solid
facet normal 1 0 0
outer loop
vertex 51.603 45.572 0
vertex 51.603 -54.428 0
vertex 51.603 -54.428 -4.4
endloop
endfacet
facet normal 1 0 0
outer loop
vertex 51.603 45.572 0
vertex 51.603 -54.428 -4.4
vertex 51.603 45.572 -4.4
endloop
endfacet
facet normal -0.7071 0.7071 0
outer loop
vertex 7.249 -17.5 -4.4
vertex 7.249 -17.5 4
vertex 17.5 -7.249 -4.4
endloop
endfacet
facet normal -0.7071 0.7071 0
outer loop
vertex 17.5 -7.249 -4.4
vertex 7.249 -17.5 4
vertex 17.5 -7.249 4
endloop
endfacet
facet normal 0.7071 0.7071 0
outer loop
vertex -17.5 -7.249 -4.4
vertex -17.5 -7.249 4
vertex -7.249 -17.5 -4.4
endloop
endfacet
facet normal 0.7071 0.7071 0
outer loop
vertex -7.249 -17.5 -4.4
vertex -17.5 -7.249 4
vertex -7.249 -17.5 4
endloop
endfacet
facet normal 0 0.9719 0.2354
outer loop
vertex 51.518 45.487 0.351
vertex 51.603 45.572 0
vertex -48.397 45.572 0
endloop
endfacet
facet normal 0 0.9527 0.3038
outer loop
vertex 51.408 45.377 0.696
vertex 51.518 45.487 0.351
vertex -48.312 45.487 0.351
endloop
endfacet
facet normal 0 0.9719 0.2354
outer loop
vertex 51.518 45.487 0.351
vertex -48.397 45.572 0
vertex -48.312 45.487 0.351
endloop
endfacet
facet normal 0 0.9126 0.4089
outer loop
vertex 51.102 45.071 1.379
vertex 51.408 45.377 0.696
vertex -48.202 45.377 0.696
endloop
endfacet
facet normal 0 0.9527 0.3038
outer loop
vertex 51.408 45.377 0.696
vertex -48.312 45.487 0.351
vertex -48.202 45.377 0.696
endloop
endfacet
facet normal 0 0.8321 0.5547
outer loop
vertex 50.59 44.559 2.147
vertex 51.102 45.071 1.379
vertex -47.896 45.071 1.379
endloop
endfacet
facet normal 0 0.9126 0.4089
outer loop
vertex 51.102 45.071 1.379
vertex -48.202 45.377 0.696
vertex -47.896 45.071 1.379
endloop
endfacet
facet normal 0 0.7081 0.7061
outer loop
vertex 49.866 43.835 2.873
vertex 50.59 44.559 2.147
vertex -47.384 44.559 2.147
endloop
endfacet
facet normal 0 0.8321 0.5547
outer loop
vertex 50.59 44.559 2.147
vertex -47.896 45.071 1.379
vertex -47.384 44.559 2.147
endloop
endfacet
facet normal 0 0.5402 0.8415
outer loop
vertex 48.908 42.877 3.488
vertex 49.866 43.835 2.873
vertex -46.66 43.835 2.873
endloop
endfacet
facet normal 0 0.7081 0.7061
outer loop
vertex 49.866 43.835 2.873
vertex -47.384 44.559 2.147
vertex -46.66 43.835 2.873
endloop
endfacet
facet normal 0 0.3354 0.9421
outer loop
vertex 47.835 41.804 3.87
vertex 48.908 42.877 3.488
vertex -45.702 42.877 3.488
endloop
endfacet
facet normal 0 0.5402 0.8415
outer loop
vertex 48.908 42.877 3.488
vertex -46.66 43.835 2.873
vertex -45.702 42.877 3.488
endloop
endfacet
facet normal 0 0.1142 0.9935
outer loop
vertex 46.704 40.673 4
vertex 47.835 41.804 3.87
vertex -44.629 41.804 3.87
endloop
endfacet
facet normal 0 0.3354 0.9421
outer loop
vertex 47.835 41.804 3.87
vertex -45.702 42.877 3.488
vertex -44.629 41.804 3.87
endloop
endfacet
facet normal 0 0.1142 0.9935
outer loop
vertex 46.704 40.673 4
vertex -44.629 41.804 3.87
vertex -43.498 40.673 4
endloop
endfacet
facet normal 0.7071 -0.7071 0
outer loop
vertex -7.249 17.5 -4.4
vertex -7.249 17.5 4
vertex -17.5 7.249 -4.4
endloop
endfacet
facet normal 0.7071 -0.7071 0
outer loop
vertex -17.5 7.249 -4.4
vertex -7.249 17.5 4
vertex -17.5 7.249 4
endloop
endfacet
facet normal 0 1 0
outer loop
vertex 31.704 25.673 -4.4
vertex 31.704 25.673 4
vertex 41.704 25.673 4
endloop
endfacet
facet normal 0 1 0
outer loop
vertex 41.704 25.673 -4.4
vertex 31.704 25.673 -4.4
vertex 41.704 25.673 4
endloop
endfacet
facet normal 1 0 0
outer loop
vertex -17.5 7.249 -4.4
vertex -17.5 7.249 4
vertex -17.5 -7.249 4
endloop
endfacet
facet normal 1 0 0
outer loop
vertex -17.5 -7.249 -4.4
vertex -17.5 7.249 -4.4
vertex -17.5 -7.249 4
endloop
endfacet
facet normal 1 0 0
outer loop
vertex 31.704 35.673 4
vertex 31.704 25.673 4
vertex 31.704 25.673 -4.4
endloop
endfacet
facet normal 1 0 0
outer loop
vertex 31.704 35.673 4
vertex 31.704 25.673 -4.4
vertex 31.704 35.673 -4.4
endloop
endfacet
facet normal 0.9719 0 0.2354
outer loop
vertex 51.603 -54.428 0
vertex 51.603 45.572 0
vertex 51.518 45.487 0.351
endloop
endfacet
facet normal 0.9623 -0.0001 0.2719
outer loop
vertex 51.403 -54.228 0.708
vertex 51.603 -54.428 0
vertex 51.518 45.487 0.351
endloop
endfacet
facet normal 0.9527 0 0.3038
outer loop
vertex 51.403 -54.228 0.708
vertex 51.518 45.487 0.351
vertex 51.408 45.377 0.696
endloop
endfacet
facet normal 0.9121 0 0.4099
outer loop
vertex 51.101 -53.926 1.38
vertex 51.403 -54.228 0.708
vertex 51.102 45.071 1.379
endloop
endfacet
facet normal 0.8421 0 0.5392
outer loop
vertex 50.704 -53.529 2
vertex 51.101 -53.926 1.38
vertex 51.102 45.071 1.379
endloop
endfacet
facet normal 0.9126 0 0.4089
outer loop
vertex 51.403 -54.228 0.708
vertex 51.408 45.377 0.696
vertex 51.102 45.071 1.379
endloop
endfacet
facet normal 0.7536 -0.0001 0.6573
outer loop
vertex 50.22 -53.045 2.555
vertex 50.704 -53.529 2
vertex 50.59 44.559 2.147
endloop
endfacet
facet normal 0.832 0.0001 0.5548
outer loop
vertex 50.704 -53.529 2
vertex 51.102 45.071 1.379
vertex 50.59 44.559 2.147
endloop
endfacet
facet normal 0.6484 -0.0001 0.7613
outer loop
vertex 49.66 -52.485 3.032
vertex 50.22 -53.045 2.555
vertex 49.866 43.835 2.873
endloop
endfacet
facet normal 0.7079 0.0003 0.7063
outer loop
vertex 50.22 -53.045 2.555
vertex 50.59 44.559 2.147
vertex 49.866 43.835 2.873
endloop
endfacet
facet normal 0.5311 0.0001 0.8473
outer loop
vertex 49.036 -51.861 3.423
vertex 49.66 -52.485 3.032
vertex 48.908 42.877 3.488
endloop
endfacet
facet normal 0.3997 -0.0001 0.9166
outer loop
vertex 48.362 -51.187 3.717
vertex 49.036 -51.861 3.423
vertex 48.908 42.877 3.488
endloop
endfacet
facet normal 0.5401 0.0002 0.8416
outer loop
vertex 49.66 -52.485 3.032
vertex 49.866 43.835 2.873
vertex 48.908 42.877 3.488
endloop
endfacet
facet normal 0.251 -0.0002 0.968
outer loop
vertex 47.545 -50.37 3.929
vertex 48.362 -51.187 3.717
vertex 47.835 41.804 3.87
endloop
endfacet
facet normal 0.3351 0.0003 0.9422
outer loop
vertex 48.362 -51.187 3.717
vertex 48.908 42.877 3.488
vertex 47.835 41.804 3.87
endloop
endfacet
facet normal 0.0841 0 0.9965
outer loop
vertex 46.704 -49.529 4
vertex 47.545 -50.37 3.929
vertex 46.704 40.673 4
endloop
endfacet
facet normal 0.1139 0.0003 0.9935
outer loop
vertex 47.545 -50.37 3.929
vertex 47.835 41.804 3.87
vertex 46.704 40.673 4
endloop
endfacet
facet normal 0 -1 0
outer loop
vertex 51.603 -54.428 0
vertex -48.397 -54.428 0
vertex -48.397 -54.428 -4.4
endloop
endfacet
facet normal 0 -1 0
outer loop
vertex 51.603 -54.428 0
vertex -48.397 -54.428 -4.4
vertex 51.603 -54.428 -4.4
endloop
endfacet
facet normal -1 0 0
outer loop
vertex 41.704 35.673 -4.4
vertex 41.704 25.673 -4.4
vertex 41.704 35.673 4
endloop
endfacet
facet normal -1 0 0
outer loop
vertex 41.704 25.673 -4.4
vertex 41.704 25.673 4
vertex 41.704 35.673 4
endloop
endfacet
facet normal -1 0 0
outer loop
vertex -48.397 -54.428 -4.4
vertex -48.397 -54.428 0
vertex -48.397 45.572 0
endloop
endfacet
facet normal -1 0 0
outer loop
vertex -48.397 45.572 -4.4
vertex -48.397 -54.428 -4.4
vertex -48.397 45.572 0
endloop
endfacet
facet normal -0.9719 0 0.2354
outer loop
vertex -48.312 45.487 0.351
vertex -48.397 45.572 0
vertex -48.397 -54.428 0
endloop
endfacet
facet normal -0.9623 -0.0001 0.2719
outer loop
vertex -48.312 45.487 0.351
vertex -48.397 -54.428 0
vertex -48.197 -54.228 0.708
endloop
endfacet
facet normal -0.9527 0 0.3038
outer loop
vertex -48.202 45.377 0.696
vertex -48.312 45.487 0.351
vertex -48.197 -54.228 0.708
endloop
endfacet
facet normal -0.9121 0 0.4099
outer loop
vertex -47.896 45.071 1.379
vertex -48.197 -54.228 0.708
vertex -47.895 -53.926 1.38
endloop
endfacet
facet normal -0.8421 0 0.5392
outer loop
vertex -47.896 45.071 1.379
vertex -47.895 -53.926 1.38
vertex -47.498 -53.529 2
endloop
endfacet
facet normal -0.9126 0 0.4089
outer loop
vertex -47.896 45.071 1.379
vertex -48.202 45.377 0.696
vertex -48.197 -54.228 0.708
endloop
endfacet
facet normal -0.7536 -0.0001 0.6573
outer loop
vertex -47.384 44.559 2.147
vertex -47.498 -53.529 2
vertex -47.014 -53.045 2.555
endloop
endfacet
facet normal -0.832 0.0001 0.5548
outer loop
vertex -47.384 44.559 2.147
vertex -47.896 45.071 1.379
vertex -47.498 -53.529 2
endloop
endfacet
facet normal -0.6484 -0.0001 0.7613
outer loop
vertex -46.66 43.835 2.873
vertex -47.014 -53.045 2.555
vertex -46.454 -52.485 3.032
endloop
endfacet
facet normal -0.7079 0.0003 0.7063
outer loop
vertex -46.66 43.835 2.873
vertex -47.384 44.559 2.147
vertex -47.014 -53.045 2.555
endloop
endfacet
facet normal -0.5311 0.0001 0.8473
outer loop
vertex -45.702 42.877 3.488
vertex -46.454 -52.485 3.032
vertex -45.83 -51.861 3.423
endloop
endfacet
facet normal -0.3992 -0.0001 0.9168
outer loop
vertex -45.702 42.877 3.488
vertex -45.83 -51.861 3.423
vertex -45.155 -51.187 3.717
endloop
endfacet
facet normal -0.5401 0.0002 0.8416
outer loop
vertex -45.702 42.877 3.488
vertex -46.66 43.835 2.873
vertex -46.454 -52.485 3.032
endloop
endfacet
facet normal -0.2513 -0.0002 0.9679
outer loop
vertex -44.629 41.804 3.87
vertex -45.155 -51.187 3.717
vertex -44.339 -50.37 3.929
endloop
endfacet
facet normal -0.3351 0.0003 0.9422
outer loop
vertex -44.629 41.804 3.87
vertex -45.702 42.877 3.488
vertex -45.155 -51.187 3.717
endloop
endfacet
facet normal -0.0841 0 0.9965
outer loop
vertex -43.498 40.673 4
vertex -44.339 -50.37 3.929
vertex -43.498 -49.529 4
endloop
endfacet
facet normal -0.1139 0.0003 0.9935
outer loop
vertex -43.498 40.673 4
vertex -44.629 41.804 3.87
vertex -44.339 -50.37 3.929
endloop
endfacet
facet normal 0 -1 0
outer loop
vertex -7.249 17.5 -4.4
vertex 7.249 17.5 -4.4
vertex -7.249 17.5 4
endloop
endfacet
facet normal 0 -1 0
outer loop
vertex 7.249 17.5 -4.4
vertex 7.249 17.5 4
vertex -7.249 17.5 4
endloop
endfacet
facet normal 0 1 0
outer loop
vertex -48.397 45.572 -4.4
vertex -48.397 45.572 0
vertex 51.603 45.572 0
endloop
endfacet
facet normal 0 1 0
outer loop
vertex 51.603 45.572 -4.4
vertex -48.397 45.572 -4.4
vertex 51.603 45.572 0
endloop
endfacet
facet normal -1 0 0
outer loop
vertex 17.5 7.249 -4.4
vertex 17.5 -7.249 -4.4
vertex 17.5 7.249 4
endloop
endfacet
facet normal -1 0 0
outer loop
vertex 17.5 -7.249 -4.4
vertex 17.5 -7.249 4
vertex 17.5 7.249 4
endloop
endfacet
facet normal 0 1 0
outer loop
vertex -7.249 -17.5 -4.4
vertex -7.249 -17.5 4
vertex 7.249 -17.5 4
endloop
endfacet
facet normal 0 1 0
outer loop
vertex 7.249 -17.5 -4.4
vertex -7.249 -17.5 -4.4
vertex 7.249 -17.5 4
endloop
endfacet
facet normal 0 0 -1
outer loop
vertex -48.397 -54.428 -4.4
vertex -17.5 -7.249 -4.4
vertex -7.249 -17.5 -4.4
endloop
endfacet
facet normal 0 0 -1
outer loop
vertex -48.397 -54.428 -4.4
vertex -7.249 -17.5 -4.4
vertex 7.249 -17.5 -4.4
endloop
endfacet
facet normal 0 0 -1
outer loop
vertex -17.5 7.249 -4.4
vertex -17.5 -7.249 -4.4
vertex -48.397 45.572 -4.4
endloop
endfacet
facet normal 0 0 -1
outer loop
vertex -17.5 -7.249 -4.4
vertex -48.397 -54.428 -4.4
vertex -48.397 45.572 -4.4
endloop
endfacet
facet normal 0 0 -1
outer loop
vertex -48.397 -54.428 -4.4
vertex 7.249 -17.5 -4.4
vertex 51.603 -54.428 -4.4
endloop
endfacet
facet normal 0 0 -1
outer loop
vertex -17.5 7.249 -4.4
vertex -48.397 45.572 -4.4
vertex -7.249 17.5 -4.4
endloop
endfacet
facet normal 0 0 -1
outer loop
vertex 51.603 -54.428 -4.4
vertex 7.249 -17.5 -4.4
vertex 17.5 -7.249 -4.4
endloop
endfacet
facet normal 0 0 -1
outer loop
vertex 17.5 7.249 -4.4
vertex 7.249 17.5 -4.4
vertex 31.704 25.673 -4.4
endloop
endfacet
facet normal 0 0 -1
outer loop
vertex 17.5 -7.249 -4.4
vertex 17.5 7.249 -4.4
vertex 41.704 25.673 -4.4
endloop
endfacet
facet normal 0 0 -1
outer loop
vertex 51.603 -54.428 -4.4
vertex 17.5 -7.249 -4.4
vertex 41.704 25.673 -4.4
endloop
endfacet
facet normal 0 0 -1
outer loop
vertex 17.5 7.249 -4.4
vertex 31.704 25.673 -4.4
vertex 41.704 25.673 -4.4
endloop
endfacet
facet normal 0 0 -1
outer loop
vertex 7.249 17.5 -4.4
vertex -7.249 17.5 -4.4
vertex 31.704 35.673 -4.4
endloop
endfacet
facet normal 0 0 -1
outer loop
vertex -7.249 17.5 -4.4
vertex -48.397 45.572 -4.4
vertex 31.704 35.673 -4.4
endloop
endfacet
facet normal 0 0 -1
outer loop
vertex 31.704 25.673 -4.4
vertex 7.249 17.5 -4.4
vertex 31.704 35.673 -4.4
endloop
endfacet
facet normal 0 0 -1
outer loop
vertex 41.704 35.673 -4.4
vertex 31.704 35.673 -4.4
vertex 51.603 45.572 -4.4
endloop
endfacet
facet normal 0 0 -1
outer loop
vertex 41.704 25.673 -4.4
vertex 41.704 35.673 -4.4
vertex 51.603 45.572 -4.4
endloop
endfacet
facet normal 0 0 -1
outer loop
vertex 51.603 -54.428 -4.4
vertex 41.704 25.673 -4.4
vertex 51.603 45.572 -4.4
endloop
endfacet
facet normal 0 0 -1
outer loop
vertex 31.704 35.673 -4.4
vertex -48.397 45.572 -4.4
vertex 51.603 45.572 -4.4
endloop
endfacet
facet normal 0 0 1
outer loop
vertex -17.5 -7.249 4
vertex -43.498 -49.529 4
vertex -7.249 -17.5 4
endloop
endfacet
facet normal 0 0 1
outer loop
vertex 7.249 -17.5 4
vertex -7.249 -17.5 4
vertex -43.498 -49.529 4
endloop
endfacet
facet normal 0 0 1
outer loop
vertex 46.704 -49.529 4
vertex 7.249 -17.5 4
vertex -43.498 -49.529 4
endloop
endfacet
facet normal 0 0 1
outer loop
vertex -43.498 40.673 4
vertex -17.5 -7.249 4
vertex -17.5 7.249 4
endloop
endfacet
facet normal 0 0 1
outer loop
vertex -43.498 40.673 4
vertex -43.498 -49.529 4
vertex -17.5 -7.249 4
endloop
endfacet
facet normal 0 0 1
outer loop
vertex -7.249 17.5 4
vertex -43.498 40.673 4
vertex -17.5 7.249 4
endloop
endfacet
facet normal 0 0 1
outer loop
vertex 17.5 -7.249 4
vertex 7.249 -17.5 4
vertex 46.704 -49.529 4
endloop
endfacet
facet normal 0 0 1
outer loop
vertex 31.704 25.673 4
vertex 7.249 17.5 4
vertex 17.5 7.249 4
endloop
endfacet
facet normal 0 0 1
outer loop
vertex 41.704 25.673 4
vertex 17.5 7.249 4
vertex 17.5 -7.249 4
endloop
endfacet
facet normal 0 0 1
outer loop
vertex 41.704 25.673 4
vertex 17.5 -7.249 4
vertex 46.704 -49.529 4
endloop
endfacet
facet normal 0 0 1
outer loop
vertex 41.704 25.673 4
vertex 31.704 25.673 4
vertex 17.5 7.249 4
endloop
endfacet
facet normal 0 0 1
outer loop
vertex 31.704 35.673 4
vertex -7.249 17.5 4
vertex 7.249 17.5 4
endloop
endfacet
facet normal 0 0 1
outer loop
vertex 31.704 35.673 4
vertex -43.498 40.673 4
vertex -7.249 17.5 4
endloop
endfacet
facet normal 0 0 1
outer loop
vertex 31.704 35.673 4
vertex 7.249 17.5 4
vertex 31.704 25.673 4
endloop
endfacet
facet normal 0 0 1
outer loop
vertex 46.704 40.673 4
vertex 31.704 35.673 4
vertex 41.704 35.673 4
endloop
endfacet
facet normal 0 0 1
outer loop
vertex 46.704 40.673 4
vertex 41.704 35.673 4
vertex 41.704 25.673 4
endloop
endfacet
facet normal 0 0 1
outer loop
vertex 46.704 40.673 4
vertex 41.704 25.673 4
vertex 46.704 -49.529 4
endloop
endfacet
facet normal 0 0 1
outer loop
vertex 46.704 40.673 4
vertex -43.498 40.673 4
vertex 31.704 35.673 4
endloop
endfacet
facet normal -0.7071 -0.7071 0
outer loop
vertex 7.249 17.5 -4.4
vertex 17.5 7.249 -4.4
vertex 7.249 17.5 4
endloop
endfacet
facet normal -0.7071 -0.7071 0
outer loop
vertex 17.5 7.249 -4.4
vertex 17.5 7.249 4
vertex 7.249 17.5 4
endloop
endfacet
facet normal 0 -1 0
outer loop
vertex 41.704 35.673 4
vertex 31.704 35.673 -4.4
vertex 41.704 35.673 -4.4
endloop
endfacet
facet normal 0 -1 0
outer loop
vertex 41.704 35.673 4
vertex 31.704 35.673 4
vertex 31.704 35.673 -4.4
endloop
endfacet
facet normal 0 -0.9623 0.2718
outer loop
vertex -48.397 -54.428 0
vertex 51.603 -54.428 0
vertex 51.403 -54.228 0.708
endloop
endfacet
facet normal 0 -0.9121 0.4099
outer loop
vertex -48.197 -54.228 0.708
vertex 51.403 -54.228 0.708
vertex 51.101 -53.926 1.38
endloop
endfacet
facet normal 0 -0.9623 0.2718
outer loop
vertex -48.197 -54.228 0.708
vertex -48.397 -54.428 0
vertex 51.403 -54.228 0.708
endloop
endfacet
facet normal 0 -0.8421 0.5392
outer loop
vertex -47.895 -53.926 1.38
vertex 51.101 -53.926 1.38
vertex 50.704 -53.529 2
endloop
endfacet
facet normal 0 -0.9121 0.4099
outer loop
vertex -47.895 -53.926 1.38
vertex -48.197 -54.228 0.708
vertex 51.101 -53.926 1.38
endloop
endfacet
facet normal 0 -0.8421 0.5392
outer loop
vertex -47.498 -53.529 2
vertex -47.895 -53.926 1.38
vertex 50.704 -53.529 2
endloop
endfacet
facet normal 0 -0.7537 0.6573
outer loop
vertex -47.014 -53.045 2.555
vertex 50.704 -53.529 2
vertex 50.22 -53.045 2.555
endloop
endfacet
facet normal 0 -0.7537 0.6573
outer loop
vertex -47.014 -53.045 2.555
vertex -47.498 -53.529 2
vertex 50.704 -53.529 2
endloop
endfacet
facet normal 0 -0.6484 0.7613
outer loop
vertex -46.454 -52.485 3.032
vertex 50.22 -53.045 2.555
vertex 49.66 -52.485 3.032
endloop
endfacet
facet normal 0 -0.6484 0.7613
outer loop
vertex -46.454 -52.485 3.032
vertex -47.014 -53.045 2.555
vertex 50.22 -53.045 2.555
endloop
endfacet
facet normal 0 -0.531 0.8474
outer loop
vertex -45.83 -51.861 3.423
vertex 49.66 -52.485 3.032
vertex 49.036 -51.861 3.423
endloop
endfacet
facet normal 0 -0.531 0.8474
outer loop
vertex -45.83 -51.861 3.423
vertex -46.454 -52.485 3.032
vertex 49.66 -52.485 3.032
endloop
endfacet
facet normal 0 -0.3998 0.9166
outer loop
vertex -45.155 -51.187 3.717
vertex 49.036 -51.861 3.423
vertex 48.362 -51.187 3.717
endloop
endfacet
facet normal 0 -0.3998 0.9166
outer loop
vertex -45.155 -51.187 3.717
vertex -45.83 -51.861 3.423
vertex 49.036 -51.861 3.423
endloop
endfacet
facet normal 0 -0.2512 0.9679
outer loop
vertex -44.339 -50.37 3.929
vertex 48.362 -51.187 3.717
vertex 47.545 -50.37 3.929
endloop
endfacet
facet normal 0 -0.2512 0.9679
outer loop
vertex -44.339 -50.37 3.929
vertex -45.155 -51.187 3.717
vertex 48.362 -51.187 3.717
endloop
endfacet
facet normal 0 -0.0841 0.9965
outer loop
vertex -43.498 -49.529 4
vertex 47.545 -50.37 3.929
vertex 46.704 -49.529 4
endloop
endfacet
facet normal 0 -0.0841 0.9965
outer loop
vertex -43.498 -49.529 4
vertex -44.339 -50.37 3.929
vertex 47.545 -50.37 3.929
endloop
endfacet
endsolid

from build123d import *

# Parameters (mm, degrees)
F0_W        = 100
F0_H        = 100
F1_DEPTH    = 4
F3_T1_DEPTH = 124.4948974279
F3_T3_DEPTH = 124.4948974279
F5_DEPTH    = 25
F4_W        = 10
F4_H        = 10
F6_DEPTH    = 25
F7_DEPTH    = 4.4


# Not quite as in the source:
# - a fillet or chamfer that OpenCascade refuses, or shapes differently, is made with other operations: its cross-section is extruded or revolved along the edge and cut away or added


with BuildPart() as f1:
    # F0 (on Top) → F1 (new body)
    with BuildSketch(Plane.XY):
        with Locations((1.60311535, -4.4280775759)):
            Rectangle(F0_W, F0_H)
    extrude(amount=F1_DEPTH)

    # F3: fillet of radius 5 on 4 edges, made by hand

    # F3_s2 → F3_t1 (cut)
    with BuildSketch(Plane.YZ.offset(-60.6443333639)):
        with BuildLine():
            ThreePointArc((-54.4280775759, 0), (-52.6913757505, 2.8729833462), (-49.5290980903, 4))
            Line((-49.5290980903, 4), (-54.4280775759, 4))
            Line((-54.4280775759, 4), (-54.4280775759, 0))
        make_face()
        with BuildLine():
            ThreePointArc((45.5719224241, 0), (43.8352205987, 2.8729833462), (40.6729429385, 4))
            Line((40.6729429385, 4), (45.5719224241, 4))
            Line((45.5719224241, 4), (45.5719224241, 0))
        make_face()
    extrude(amount=F3_T1_DEPTH, mode=Mode.SUBTRACT)

    # F3_s4 → F3_t3 (cut)
    with BuildSketch(Plane.XZ.offset(-57.819371138)):
        with BuildLine():
            ThreePointArc((51.60311535, 0), (49.8664135246, 2.8729833462), (46.7041358644, 4))
            Line((46.7041358644, 4), (51.60311535, 4))
            Line((51.60311535, 4), (51.60311535, 0))
        make_face()
        with BuildLine():
            ThreePointArc((-48.39688465, 0), (-46.6601828246, 2.8729833462), (-43.4979051644, 4))
            Line((-43.4979051644, 4), (-48.39688465, 4))
            Line((-48.39688465, 4), (-48.39688465, 0))
        make_face()
    extrude(amount=F3_T3_DEPTH, mode=Mode.SUBTRACT)

    # F2 (on face) → F5 (cut)
    with BuildSketch(Plane.XY.offset(4)):
        Polygon((-7.2487373415, -17.5), (7.2487373415, -17.5), (17.5, -7.2487373415), (17.5, 7.2487373415), (7.2487373415, 17.5), (-7.2487373415, 17.5), (-17.5, 7.2487373415), (-17.5, -7.2487373415), align=None)
    extrude(amount=-F5_DEPTH, mode=Mode.SUBTRACT)

    # F4 (on face) → F6 (cut)
    with BuildSketch(Plane.XY.offset(4)):
        with Locations((36.7041358644, 30.6729429385)):
            Rectangle(F4_W, F4_H)
    extrude(amount=-F6_DEPTH, mode=Mode.SUBTRACT)

    # F7 (add): a face of the model
    f7_faces = [f1.faces().sort_by_distance(p)[0] for p in [
        (1.60311535, -53.0138640135, 0),
    ]]
    extrude(f7_faces, amount=F7_DEPTH)


solid = f1.part
